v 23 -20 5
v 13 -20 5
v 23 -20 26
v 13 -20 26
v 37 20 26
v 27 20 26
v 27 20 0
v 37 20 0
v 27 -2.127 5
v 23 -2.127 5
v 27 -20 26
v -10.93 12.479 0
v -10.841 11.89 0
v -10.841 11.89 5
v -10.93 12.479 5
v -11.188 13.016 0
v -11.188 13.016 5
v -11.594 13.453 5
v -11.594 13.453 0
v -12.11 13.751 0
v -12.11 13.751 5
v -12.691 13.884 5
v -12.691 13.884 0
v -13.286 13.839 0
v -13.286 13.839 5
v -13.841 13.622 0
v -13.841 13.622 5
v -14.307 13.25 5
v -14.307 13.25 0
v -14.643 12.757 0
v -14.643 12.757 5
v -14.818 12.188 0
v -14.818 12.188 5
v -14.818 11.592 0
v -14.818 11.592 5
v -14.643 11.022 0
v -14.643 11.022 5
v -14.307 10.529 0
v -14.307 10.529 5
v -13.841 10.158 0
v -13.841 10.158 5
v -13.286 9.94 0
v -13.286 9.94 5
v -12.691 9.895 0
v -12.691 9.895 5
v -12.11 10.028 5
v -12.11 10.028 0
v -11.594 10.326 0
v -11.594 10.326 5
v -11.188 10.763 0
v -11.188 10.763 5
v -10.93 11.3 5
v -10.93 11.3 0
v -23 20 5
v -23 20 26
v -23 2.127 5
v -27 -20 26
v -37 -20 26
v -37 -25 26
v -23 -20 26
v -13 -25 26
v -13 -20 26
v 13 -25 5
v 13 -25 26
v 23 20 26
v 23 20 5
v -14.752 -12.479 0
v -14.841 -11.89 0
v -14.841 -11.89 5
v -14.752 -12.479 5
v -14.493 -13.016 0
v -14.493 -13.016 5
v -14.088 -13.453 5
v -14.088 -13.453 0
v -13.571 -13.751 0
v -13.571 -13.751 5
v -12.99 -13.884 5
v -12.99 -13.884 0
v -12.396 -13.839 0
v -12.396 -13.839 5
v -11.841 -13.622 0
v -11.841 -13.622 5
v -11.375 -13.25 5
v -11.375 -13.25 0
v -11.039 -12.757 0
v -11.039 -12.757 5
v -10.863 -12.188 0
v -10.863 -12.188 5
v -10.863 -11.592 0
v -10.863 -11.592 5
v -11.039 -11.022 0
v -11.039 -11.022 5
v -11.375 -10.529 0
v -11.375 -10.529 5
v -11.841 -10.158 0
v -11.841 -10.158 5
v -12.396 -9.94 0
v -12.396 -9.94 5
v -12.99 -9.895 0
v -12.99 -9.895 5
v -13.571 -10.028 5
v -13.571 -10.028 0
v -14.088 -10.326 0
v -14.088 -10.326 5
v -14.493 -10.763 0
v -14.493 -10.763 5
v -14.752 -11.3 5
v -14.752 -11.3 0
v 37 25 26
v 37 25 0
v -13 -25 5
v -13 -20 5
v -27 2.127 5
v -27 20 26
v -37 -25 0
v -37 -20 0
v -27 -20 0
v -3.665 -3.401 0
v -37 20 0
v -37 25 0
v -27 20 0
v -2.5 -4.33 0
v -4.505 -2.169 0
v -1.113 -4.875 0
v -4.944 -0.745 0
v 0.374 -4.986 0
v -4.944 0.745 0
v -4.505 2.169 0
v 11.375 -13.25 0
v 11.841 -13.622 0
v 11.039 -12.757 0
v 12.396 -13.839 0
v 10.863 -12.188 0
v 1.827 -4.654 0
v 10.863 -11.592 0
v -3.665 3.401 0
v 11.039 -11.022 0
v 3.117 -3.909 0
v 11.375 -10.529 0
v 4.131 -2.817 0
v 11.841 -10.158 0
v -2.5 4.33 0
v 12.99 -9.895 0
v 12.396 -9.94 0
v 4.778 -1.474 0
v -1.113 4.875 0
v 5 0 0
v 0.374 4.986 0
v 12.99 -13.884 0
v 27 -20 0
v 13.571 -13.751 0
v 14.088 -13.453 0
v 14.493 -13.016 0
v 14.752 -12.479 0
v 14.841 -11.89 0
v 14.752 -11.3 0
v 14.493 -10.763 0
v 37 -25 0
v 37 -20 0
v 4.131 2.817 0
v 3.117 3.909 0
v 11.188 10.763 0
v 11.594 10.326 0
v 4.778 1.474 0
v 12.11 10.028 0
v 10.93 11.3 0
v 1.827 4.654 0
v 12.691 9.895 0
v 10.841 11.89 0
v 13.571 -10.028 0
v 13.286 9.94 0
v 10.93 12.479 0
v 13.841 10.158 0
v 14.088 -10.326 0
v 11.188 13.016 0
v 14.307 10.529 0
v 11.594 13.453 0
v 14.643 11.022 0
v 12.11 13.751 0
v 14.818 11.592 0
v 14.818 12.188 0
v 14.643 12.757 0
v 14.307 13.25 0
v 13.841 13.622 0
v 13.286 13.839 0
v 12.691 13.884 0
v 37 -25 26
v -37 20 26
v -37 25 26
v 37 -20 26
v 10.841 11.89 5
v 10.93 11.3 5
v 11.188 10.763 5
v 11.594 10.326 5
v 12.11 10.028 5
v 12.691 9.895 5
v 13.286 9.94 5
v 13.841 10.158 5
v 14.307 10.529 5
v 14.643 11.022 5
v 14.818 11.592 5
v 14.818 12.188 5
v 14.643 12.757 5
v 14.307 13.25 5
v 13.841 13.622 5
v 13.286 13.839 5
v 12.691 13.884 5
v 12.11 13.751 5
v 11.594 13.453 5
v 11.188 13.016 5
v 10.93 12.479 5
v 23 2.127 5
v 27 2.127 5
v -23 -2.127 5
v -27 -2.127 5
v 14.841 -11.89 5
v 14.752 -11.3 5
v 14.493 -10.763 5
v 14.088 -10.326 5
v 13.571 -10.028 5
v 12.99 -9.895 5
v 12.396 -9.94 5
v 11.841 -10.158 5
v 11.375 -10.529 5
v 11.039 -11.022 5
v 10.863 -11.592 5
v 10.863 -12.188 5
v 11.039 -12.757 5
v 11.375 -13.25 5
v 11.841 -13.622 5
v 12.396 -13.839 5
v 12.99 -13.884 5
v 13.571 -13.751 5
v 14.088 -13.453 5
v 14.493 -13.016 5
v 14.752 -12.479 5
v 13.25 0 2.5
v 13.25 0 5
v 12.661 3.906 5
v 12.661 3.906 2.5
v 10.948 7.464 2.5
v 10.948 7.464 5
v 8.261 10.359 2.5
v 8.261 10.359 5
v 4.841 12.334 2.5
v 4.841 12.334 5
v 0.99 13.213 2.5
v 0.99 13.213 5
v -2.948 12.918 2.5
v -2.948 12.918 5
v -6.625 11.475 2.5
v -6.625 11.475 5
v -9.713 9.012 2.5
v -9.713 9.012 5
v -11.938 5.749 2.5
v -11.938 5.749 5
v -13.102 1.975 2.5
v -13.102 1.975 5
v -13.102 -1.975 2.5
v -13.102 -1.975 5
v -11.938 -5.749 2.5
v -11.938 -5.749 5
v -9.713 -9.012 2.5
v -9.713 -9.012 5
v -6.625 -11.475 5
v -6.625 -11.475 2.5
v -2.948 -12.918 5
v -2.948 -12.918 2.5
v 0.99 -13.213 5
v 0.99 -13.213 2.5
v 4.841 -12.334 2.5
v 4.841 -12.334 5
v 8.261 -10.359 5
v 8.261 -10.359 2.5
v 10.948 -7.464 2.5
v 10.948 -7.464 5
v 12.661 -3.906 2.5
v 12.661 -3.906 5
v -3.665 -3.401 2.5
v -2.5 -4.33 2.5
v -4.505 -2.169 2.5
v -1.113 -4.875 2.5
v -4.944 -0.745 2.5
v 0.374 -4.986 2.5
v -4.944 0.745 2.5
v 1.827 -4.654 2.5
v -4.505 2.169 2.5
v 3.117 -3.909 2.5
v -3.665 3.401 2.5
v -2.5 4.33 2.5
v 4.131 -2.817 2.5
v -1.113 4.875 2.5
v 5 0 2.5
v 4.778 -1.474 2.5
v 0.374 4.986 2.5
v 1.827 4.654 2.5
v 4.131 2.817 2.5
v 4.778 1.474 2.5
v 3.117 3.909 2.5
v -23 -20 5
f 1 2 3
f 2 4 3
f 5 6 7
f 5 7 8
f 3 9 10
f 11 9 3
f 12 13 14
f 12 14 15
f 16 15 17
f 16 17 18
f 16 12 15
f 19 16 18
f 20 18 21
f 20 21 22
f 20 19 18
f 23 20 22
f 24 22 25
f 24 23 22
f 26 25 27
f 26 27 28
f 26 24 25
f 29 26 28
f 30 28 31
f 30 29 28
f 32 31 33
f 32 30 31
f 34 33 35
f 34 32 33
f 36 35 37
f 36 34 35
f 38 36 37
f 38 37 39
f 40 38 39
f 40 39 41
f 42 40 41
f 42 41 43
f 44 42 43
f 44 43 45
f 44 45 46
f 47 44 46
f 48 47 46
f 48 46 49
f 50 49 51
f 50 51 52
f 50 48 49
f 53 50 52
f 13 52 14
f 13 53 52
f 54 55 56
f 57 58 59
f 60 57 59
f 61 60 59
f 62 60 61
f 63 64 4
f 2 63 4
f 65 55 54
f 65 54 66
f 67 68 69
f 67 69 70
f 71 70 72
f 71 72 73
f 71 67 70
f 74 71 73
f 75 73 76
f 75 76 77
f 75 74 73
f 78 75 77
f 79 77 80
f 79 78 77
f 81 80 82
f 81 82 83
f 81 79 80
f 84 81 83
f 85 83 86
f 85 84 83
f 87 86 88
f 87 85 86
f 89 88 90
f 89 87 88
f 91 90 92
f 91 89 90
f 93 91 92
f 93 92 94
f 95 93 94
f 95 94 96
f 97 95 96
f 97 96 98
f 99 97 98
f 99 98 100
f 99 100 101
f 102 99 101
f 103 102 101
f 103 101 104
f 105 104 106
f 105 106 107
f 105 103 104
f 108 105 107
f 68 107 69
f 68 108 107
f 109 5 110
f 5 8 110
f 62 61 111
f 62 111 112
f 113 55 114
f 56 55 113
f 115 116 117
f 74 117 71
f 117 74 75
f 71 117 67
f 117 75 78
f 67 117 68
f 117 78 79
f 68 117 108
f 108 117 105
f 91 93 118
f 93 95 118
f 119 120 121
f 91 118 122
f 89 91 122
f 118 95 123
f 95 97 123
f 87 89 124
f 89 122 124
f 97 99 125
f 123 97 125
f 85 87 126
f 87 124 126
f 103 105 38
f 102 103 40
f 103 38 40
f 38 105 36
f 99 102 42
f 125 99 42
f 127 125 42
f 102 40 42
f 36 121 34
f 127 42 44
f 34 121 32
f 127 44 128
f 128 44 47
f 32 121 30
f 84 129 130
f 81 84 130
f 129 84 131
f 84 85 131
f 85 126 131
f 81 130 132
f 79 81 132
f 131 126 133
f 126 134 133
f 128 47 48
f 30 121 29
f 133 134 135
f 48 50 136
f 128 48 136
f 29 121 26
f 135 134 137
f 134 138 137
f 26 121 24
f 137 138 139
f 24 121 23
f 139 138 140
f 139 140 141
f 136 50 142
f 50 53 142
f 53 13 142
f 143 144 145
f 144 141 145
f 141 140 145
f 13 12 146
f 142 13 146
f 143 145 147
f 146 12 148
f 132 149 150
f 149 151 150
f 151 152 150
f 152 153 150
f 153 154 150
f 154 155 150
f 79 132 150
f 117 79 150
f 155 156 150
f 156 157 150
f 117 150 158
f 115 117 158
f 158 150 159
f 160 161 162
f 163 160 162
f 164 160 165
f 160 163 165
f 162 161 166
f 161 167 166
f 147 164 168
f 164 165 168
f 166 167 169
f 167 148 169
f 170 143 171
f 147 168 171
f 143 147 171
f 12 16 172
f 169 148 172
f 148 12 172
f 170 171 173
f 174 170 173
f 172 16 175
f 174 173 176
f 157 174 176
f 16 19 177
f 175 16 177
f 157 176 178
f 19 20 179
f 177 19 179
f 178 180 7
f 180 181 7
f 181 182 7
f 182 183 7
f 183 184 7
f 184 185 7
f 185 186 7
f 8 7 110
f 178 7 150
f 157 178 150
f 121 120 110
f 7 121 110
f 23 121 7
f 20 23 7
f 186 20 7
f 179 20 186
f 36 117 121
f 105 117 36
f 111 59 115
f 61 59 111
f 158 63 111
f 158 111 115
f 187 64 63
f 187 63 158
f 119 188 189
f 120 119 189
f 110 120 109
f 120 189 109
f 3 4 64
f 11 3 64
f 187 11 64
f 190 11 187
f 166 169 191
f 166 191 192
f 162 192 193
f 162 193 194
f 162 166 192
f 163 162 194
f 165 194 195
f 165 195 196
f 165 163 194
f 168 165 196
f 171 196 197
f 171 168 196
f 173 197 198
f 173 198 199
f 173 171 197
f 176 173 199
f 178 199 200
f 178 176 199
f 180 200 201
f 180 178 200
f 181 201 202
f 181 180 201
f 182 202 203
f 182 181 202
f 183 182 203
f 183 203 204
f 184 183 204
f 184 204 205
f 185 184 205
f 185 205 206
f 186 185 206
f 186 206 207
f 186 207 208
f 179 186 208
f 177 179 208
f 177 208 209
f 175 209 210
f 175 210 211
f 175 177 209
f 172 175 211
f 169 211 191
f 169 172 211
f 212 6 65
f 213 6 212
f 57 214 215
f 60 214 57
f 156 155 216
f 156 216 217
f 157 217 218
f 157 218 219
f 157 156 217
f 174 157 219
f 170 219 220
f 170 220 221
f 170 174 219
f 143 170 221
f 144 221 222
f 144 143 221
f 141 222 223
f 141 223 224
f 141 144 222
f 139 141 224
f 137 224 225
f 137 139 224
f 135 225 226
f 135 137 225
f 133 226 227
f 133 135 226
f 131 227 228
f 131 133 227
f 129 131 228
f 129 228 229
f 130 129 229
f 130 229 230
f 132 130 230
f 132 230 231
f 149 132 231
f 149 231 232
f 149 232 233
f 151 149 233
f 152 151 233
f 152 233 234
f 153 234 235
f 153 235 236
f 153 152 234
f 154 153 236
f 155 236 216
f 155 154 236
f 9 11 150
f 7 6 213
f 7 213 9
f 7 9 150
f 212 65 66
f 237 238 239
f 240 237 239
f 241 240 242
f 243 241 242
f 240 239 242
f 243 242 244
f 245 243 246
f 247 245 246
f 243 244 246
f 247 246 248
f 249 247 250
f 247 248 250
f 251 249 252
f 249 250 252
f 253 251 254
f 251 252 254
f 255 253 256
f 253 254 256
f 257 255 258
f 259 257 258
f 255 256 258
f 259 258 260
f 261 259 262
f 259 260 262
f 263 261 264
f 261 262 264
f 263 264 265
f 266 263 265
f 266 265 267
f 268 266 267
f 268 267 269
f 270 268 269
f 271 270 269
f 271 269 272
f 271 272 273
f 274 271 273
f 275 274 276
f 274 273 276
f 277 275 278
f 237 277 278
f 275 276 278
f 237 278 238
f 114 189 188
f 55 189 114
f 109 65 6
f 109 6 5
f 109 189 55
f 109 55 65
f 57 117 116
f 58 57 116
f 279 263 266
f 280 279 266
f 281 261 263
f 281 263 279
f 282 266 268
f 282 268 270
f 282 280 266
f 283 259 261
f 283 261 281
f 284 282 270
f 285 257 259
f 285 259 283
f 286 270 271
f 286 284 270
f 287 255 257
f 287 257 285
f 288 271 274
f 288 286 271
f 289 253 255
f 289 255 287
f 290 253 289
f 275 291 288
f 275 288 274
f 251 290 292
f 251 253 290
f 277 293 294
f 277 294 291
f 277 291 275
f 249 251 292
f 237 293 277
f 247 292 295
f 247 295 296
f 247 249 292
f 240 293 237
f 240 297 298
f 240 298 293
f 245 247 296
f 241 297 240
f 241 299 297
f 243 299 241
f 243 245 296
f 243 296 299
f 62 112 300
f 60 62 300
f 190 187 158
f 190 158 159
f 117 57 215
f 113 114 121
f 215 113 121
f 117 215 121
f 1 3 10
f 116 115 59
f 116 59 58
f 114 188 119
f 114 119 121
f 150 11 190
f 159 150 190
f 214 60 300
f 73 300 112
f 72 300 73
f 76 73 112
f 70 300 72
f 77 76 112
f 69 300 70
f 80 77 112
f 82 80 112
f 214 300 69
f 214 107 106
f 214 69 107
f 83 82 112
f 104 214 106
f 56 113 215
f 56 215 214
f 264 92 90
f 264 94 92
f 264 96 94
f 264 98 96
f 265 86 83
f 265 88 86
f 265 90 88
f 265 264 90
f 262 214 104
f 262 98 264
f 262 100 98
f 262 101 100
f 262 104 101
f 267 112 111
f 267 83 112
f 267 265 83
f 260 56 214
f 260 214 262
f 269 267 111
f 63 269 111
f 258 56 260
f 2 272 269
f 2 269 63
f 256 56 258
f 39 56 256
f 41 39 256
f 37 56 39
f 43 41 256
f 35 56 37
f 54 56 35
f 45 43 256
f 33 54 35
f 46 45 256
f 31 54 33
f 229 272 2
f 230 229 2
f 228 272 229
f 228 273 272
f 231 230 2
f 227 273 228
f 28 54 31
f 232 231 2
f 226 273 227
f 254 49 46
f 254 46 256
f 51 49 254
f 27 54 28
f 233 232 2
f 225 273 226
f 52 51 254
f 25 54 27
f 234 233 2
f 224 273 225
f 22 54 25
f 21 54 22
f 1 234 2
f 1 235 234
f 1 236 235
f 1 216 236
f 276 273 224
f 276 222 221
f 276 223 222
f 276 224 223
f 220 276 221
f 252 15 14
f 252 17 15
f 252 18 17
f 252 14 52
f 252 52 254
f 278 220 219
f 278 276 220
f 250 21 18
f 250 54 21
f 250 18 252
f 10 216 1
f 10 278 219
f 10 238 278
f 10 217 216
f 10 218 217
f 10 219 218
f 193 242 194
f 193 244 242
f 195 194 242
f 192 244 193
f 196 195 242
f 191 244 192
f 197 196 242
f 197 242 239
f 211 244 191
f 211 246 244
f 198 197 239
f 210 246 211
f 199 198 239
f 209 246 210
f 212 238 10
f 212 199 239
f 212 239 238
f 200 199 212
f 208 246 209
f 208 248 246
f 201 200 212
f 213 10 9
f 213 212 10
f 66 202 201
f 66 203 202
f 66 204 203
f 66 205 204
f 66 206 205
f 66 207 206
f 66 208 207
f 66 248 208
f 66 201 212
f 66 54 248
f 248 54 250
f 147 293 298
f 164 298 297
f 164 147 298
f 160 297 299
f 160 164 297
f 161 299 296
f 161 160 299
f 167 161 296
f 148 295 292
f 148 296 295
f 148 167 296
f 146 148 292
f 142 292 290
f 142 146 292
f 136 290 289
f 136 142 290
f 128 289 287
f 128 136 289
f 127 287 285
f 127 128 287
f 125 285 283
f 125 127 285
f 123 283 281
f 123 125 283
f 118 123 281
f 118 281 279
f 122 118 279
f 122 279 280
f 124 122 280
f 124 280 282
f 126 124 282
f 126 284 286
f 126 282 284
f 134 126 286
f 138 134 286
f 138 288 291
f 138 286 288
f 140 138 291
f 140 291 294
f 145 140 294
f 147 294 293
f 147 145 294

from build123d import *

# Parameters (mm, degrees)
SKETCH2_W           = 54
SKETCH2_H           = 50
SKETCH2_R           = 5
SKETCH2_R_2         = 2
BOSS_EXTRUDE1_DEPTH = 5
SKETCH3_W           = 74
SKETCH3_H           = 5
SKETCH3_W_2         = 24
BOSS_EXTRUDE2_DEPTH = 21
SKETCH3_3_W         = 74
SKETCH3_3_H         = 5
BOSS_EXTRUDE3_DEPTH = 5
SKETCH3_4_W         = 10
SKETCH3_4_H         = 5
BOSS_EXTRUDE4_DEPTH = 5
SKETCH4_R           = 13.25
CUT_EXTRUDE1_DEPTH  = 2.5
BOSS_EXTRUDE7_DEPTH = 4
BOSS_EXTRUDE8_START = -50
BOSS_EXTRUDE8_DEPTH = 4


with BuildPart() as part:
    # Sketch2 → Boss-Extrude1 (new body)
    with BuildSketch(Plane.XY):
        Rectangle(SKETCH2_W, SKETCH2_H)
        Circle(SKETCH2_R, mode=Mode.SUBTRACT)
        with Locations((-12.840811795, 11.889640551)):
            Circle(SKETCH2_R_2, mode=Mode.SUBTRACT)
        with Locations((-12.840811795, -11.889640551)):
            Circle(SKETCH2_R_2, mode=Mode.SUBTRACT)
        with Locations((12.840811795, -11.889640551)):
            Circle(SKETCH2_R_2, mode=Mode.SUBTRACT)
        with Locations((12.840811795, 11.889640551)):
            Circle(SKETCH2_R_2, mode=Mode.SUBTRACT)
    extrude(amount=BOSS_EXTRUDE1_DEPTH)

    # Sketch3 → Boss-Extrude2 (add)
    with BuildSketch(Plane.XY.offset(5)):
        with Locations((0, 22.5)):
            Rectangle(SKETCH3_W, SKETCH3_H)
        with Locations((-25, -22.5)):
            Rectangle(SKETCH3_W_2, SKETCH3_H)
        with Locations((25, -22.5)):
            Rectangle(SKETCH3_W_2, SKETCH3_H)
    extrude(amount=BOSS_EXTRUDE2_DEPTH)

    # Sketch3<3> → Boss-Extrude3 (add)
    with BuildSketch(Plane.XY.offset(5)):
        with Locations((0, 22.5)):
            Rectangle(SKETCH3_3_W, SKETCH3_3_H)
    extrude(amount=-BOSS_EXTRUDE3_DEPTH)

    # Sketch3<4> → Boss-Extrude4 (add)
    with BuildSketch(Plane.XY.offset(5)):
        with Locations((32, -22.5)):
            Rectangle(SKETCH3_4_W, SKETCH3_4_H)
        with Locations((-32, -22.5)):
            Rectangle(SKETCH3_4_W, SKETCH3_4_H)
    extrude(amount=-BOSS_EXTRUDE4_DEPTH)

    # Sketch4 → Cut-Extrude1 (cut)
    with BuildSketch(Plane.XY.offset(5)):
        Circle(SKETCH4_R)
    extrude(amount=-CUT_EXTRUDE1_DEPTH, mode=Mode.SUBTRACT)

    # Sketch5 → Boss-Extrude7 (add)
    with BuildSketch(Plane(origin=(27, 0, 0), x_dir=(0, 0, -1), z_dir=(1, 0, 0))):
        Polygon((-26, 20), (-5, 2.126814834), (-5, 20), align=None)
        Polygon((-26, -20), (-5, -20), (-5, -2.126814834), align=None)
    extrude(amount=-BOSS_EXTRUDE7_DEPTH)

    # Sketch5<2> → Boss-Extrude8 (add)
    with BuildSketch(Plane(origin=(27, 0, 0), x_dir=(0, 0, -1), z_dir=(1, 0, 0)).offset(BOSS_EXTRUDE8_START)):
        Polygon((-26, 20), (-5, 2.126814834), (-5, 20), align=None)
        Polygon((-26, -20), (-5, -20), (-5, -2.126814834), align=None)
    extrude(amount=-BOSS_EXTRUDE8_DEPTH)


solid = part.part
